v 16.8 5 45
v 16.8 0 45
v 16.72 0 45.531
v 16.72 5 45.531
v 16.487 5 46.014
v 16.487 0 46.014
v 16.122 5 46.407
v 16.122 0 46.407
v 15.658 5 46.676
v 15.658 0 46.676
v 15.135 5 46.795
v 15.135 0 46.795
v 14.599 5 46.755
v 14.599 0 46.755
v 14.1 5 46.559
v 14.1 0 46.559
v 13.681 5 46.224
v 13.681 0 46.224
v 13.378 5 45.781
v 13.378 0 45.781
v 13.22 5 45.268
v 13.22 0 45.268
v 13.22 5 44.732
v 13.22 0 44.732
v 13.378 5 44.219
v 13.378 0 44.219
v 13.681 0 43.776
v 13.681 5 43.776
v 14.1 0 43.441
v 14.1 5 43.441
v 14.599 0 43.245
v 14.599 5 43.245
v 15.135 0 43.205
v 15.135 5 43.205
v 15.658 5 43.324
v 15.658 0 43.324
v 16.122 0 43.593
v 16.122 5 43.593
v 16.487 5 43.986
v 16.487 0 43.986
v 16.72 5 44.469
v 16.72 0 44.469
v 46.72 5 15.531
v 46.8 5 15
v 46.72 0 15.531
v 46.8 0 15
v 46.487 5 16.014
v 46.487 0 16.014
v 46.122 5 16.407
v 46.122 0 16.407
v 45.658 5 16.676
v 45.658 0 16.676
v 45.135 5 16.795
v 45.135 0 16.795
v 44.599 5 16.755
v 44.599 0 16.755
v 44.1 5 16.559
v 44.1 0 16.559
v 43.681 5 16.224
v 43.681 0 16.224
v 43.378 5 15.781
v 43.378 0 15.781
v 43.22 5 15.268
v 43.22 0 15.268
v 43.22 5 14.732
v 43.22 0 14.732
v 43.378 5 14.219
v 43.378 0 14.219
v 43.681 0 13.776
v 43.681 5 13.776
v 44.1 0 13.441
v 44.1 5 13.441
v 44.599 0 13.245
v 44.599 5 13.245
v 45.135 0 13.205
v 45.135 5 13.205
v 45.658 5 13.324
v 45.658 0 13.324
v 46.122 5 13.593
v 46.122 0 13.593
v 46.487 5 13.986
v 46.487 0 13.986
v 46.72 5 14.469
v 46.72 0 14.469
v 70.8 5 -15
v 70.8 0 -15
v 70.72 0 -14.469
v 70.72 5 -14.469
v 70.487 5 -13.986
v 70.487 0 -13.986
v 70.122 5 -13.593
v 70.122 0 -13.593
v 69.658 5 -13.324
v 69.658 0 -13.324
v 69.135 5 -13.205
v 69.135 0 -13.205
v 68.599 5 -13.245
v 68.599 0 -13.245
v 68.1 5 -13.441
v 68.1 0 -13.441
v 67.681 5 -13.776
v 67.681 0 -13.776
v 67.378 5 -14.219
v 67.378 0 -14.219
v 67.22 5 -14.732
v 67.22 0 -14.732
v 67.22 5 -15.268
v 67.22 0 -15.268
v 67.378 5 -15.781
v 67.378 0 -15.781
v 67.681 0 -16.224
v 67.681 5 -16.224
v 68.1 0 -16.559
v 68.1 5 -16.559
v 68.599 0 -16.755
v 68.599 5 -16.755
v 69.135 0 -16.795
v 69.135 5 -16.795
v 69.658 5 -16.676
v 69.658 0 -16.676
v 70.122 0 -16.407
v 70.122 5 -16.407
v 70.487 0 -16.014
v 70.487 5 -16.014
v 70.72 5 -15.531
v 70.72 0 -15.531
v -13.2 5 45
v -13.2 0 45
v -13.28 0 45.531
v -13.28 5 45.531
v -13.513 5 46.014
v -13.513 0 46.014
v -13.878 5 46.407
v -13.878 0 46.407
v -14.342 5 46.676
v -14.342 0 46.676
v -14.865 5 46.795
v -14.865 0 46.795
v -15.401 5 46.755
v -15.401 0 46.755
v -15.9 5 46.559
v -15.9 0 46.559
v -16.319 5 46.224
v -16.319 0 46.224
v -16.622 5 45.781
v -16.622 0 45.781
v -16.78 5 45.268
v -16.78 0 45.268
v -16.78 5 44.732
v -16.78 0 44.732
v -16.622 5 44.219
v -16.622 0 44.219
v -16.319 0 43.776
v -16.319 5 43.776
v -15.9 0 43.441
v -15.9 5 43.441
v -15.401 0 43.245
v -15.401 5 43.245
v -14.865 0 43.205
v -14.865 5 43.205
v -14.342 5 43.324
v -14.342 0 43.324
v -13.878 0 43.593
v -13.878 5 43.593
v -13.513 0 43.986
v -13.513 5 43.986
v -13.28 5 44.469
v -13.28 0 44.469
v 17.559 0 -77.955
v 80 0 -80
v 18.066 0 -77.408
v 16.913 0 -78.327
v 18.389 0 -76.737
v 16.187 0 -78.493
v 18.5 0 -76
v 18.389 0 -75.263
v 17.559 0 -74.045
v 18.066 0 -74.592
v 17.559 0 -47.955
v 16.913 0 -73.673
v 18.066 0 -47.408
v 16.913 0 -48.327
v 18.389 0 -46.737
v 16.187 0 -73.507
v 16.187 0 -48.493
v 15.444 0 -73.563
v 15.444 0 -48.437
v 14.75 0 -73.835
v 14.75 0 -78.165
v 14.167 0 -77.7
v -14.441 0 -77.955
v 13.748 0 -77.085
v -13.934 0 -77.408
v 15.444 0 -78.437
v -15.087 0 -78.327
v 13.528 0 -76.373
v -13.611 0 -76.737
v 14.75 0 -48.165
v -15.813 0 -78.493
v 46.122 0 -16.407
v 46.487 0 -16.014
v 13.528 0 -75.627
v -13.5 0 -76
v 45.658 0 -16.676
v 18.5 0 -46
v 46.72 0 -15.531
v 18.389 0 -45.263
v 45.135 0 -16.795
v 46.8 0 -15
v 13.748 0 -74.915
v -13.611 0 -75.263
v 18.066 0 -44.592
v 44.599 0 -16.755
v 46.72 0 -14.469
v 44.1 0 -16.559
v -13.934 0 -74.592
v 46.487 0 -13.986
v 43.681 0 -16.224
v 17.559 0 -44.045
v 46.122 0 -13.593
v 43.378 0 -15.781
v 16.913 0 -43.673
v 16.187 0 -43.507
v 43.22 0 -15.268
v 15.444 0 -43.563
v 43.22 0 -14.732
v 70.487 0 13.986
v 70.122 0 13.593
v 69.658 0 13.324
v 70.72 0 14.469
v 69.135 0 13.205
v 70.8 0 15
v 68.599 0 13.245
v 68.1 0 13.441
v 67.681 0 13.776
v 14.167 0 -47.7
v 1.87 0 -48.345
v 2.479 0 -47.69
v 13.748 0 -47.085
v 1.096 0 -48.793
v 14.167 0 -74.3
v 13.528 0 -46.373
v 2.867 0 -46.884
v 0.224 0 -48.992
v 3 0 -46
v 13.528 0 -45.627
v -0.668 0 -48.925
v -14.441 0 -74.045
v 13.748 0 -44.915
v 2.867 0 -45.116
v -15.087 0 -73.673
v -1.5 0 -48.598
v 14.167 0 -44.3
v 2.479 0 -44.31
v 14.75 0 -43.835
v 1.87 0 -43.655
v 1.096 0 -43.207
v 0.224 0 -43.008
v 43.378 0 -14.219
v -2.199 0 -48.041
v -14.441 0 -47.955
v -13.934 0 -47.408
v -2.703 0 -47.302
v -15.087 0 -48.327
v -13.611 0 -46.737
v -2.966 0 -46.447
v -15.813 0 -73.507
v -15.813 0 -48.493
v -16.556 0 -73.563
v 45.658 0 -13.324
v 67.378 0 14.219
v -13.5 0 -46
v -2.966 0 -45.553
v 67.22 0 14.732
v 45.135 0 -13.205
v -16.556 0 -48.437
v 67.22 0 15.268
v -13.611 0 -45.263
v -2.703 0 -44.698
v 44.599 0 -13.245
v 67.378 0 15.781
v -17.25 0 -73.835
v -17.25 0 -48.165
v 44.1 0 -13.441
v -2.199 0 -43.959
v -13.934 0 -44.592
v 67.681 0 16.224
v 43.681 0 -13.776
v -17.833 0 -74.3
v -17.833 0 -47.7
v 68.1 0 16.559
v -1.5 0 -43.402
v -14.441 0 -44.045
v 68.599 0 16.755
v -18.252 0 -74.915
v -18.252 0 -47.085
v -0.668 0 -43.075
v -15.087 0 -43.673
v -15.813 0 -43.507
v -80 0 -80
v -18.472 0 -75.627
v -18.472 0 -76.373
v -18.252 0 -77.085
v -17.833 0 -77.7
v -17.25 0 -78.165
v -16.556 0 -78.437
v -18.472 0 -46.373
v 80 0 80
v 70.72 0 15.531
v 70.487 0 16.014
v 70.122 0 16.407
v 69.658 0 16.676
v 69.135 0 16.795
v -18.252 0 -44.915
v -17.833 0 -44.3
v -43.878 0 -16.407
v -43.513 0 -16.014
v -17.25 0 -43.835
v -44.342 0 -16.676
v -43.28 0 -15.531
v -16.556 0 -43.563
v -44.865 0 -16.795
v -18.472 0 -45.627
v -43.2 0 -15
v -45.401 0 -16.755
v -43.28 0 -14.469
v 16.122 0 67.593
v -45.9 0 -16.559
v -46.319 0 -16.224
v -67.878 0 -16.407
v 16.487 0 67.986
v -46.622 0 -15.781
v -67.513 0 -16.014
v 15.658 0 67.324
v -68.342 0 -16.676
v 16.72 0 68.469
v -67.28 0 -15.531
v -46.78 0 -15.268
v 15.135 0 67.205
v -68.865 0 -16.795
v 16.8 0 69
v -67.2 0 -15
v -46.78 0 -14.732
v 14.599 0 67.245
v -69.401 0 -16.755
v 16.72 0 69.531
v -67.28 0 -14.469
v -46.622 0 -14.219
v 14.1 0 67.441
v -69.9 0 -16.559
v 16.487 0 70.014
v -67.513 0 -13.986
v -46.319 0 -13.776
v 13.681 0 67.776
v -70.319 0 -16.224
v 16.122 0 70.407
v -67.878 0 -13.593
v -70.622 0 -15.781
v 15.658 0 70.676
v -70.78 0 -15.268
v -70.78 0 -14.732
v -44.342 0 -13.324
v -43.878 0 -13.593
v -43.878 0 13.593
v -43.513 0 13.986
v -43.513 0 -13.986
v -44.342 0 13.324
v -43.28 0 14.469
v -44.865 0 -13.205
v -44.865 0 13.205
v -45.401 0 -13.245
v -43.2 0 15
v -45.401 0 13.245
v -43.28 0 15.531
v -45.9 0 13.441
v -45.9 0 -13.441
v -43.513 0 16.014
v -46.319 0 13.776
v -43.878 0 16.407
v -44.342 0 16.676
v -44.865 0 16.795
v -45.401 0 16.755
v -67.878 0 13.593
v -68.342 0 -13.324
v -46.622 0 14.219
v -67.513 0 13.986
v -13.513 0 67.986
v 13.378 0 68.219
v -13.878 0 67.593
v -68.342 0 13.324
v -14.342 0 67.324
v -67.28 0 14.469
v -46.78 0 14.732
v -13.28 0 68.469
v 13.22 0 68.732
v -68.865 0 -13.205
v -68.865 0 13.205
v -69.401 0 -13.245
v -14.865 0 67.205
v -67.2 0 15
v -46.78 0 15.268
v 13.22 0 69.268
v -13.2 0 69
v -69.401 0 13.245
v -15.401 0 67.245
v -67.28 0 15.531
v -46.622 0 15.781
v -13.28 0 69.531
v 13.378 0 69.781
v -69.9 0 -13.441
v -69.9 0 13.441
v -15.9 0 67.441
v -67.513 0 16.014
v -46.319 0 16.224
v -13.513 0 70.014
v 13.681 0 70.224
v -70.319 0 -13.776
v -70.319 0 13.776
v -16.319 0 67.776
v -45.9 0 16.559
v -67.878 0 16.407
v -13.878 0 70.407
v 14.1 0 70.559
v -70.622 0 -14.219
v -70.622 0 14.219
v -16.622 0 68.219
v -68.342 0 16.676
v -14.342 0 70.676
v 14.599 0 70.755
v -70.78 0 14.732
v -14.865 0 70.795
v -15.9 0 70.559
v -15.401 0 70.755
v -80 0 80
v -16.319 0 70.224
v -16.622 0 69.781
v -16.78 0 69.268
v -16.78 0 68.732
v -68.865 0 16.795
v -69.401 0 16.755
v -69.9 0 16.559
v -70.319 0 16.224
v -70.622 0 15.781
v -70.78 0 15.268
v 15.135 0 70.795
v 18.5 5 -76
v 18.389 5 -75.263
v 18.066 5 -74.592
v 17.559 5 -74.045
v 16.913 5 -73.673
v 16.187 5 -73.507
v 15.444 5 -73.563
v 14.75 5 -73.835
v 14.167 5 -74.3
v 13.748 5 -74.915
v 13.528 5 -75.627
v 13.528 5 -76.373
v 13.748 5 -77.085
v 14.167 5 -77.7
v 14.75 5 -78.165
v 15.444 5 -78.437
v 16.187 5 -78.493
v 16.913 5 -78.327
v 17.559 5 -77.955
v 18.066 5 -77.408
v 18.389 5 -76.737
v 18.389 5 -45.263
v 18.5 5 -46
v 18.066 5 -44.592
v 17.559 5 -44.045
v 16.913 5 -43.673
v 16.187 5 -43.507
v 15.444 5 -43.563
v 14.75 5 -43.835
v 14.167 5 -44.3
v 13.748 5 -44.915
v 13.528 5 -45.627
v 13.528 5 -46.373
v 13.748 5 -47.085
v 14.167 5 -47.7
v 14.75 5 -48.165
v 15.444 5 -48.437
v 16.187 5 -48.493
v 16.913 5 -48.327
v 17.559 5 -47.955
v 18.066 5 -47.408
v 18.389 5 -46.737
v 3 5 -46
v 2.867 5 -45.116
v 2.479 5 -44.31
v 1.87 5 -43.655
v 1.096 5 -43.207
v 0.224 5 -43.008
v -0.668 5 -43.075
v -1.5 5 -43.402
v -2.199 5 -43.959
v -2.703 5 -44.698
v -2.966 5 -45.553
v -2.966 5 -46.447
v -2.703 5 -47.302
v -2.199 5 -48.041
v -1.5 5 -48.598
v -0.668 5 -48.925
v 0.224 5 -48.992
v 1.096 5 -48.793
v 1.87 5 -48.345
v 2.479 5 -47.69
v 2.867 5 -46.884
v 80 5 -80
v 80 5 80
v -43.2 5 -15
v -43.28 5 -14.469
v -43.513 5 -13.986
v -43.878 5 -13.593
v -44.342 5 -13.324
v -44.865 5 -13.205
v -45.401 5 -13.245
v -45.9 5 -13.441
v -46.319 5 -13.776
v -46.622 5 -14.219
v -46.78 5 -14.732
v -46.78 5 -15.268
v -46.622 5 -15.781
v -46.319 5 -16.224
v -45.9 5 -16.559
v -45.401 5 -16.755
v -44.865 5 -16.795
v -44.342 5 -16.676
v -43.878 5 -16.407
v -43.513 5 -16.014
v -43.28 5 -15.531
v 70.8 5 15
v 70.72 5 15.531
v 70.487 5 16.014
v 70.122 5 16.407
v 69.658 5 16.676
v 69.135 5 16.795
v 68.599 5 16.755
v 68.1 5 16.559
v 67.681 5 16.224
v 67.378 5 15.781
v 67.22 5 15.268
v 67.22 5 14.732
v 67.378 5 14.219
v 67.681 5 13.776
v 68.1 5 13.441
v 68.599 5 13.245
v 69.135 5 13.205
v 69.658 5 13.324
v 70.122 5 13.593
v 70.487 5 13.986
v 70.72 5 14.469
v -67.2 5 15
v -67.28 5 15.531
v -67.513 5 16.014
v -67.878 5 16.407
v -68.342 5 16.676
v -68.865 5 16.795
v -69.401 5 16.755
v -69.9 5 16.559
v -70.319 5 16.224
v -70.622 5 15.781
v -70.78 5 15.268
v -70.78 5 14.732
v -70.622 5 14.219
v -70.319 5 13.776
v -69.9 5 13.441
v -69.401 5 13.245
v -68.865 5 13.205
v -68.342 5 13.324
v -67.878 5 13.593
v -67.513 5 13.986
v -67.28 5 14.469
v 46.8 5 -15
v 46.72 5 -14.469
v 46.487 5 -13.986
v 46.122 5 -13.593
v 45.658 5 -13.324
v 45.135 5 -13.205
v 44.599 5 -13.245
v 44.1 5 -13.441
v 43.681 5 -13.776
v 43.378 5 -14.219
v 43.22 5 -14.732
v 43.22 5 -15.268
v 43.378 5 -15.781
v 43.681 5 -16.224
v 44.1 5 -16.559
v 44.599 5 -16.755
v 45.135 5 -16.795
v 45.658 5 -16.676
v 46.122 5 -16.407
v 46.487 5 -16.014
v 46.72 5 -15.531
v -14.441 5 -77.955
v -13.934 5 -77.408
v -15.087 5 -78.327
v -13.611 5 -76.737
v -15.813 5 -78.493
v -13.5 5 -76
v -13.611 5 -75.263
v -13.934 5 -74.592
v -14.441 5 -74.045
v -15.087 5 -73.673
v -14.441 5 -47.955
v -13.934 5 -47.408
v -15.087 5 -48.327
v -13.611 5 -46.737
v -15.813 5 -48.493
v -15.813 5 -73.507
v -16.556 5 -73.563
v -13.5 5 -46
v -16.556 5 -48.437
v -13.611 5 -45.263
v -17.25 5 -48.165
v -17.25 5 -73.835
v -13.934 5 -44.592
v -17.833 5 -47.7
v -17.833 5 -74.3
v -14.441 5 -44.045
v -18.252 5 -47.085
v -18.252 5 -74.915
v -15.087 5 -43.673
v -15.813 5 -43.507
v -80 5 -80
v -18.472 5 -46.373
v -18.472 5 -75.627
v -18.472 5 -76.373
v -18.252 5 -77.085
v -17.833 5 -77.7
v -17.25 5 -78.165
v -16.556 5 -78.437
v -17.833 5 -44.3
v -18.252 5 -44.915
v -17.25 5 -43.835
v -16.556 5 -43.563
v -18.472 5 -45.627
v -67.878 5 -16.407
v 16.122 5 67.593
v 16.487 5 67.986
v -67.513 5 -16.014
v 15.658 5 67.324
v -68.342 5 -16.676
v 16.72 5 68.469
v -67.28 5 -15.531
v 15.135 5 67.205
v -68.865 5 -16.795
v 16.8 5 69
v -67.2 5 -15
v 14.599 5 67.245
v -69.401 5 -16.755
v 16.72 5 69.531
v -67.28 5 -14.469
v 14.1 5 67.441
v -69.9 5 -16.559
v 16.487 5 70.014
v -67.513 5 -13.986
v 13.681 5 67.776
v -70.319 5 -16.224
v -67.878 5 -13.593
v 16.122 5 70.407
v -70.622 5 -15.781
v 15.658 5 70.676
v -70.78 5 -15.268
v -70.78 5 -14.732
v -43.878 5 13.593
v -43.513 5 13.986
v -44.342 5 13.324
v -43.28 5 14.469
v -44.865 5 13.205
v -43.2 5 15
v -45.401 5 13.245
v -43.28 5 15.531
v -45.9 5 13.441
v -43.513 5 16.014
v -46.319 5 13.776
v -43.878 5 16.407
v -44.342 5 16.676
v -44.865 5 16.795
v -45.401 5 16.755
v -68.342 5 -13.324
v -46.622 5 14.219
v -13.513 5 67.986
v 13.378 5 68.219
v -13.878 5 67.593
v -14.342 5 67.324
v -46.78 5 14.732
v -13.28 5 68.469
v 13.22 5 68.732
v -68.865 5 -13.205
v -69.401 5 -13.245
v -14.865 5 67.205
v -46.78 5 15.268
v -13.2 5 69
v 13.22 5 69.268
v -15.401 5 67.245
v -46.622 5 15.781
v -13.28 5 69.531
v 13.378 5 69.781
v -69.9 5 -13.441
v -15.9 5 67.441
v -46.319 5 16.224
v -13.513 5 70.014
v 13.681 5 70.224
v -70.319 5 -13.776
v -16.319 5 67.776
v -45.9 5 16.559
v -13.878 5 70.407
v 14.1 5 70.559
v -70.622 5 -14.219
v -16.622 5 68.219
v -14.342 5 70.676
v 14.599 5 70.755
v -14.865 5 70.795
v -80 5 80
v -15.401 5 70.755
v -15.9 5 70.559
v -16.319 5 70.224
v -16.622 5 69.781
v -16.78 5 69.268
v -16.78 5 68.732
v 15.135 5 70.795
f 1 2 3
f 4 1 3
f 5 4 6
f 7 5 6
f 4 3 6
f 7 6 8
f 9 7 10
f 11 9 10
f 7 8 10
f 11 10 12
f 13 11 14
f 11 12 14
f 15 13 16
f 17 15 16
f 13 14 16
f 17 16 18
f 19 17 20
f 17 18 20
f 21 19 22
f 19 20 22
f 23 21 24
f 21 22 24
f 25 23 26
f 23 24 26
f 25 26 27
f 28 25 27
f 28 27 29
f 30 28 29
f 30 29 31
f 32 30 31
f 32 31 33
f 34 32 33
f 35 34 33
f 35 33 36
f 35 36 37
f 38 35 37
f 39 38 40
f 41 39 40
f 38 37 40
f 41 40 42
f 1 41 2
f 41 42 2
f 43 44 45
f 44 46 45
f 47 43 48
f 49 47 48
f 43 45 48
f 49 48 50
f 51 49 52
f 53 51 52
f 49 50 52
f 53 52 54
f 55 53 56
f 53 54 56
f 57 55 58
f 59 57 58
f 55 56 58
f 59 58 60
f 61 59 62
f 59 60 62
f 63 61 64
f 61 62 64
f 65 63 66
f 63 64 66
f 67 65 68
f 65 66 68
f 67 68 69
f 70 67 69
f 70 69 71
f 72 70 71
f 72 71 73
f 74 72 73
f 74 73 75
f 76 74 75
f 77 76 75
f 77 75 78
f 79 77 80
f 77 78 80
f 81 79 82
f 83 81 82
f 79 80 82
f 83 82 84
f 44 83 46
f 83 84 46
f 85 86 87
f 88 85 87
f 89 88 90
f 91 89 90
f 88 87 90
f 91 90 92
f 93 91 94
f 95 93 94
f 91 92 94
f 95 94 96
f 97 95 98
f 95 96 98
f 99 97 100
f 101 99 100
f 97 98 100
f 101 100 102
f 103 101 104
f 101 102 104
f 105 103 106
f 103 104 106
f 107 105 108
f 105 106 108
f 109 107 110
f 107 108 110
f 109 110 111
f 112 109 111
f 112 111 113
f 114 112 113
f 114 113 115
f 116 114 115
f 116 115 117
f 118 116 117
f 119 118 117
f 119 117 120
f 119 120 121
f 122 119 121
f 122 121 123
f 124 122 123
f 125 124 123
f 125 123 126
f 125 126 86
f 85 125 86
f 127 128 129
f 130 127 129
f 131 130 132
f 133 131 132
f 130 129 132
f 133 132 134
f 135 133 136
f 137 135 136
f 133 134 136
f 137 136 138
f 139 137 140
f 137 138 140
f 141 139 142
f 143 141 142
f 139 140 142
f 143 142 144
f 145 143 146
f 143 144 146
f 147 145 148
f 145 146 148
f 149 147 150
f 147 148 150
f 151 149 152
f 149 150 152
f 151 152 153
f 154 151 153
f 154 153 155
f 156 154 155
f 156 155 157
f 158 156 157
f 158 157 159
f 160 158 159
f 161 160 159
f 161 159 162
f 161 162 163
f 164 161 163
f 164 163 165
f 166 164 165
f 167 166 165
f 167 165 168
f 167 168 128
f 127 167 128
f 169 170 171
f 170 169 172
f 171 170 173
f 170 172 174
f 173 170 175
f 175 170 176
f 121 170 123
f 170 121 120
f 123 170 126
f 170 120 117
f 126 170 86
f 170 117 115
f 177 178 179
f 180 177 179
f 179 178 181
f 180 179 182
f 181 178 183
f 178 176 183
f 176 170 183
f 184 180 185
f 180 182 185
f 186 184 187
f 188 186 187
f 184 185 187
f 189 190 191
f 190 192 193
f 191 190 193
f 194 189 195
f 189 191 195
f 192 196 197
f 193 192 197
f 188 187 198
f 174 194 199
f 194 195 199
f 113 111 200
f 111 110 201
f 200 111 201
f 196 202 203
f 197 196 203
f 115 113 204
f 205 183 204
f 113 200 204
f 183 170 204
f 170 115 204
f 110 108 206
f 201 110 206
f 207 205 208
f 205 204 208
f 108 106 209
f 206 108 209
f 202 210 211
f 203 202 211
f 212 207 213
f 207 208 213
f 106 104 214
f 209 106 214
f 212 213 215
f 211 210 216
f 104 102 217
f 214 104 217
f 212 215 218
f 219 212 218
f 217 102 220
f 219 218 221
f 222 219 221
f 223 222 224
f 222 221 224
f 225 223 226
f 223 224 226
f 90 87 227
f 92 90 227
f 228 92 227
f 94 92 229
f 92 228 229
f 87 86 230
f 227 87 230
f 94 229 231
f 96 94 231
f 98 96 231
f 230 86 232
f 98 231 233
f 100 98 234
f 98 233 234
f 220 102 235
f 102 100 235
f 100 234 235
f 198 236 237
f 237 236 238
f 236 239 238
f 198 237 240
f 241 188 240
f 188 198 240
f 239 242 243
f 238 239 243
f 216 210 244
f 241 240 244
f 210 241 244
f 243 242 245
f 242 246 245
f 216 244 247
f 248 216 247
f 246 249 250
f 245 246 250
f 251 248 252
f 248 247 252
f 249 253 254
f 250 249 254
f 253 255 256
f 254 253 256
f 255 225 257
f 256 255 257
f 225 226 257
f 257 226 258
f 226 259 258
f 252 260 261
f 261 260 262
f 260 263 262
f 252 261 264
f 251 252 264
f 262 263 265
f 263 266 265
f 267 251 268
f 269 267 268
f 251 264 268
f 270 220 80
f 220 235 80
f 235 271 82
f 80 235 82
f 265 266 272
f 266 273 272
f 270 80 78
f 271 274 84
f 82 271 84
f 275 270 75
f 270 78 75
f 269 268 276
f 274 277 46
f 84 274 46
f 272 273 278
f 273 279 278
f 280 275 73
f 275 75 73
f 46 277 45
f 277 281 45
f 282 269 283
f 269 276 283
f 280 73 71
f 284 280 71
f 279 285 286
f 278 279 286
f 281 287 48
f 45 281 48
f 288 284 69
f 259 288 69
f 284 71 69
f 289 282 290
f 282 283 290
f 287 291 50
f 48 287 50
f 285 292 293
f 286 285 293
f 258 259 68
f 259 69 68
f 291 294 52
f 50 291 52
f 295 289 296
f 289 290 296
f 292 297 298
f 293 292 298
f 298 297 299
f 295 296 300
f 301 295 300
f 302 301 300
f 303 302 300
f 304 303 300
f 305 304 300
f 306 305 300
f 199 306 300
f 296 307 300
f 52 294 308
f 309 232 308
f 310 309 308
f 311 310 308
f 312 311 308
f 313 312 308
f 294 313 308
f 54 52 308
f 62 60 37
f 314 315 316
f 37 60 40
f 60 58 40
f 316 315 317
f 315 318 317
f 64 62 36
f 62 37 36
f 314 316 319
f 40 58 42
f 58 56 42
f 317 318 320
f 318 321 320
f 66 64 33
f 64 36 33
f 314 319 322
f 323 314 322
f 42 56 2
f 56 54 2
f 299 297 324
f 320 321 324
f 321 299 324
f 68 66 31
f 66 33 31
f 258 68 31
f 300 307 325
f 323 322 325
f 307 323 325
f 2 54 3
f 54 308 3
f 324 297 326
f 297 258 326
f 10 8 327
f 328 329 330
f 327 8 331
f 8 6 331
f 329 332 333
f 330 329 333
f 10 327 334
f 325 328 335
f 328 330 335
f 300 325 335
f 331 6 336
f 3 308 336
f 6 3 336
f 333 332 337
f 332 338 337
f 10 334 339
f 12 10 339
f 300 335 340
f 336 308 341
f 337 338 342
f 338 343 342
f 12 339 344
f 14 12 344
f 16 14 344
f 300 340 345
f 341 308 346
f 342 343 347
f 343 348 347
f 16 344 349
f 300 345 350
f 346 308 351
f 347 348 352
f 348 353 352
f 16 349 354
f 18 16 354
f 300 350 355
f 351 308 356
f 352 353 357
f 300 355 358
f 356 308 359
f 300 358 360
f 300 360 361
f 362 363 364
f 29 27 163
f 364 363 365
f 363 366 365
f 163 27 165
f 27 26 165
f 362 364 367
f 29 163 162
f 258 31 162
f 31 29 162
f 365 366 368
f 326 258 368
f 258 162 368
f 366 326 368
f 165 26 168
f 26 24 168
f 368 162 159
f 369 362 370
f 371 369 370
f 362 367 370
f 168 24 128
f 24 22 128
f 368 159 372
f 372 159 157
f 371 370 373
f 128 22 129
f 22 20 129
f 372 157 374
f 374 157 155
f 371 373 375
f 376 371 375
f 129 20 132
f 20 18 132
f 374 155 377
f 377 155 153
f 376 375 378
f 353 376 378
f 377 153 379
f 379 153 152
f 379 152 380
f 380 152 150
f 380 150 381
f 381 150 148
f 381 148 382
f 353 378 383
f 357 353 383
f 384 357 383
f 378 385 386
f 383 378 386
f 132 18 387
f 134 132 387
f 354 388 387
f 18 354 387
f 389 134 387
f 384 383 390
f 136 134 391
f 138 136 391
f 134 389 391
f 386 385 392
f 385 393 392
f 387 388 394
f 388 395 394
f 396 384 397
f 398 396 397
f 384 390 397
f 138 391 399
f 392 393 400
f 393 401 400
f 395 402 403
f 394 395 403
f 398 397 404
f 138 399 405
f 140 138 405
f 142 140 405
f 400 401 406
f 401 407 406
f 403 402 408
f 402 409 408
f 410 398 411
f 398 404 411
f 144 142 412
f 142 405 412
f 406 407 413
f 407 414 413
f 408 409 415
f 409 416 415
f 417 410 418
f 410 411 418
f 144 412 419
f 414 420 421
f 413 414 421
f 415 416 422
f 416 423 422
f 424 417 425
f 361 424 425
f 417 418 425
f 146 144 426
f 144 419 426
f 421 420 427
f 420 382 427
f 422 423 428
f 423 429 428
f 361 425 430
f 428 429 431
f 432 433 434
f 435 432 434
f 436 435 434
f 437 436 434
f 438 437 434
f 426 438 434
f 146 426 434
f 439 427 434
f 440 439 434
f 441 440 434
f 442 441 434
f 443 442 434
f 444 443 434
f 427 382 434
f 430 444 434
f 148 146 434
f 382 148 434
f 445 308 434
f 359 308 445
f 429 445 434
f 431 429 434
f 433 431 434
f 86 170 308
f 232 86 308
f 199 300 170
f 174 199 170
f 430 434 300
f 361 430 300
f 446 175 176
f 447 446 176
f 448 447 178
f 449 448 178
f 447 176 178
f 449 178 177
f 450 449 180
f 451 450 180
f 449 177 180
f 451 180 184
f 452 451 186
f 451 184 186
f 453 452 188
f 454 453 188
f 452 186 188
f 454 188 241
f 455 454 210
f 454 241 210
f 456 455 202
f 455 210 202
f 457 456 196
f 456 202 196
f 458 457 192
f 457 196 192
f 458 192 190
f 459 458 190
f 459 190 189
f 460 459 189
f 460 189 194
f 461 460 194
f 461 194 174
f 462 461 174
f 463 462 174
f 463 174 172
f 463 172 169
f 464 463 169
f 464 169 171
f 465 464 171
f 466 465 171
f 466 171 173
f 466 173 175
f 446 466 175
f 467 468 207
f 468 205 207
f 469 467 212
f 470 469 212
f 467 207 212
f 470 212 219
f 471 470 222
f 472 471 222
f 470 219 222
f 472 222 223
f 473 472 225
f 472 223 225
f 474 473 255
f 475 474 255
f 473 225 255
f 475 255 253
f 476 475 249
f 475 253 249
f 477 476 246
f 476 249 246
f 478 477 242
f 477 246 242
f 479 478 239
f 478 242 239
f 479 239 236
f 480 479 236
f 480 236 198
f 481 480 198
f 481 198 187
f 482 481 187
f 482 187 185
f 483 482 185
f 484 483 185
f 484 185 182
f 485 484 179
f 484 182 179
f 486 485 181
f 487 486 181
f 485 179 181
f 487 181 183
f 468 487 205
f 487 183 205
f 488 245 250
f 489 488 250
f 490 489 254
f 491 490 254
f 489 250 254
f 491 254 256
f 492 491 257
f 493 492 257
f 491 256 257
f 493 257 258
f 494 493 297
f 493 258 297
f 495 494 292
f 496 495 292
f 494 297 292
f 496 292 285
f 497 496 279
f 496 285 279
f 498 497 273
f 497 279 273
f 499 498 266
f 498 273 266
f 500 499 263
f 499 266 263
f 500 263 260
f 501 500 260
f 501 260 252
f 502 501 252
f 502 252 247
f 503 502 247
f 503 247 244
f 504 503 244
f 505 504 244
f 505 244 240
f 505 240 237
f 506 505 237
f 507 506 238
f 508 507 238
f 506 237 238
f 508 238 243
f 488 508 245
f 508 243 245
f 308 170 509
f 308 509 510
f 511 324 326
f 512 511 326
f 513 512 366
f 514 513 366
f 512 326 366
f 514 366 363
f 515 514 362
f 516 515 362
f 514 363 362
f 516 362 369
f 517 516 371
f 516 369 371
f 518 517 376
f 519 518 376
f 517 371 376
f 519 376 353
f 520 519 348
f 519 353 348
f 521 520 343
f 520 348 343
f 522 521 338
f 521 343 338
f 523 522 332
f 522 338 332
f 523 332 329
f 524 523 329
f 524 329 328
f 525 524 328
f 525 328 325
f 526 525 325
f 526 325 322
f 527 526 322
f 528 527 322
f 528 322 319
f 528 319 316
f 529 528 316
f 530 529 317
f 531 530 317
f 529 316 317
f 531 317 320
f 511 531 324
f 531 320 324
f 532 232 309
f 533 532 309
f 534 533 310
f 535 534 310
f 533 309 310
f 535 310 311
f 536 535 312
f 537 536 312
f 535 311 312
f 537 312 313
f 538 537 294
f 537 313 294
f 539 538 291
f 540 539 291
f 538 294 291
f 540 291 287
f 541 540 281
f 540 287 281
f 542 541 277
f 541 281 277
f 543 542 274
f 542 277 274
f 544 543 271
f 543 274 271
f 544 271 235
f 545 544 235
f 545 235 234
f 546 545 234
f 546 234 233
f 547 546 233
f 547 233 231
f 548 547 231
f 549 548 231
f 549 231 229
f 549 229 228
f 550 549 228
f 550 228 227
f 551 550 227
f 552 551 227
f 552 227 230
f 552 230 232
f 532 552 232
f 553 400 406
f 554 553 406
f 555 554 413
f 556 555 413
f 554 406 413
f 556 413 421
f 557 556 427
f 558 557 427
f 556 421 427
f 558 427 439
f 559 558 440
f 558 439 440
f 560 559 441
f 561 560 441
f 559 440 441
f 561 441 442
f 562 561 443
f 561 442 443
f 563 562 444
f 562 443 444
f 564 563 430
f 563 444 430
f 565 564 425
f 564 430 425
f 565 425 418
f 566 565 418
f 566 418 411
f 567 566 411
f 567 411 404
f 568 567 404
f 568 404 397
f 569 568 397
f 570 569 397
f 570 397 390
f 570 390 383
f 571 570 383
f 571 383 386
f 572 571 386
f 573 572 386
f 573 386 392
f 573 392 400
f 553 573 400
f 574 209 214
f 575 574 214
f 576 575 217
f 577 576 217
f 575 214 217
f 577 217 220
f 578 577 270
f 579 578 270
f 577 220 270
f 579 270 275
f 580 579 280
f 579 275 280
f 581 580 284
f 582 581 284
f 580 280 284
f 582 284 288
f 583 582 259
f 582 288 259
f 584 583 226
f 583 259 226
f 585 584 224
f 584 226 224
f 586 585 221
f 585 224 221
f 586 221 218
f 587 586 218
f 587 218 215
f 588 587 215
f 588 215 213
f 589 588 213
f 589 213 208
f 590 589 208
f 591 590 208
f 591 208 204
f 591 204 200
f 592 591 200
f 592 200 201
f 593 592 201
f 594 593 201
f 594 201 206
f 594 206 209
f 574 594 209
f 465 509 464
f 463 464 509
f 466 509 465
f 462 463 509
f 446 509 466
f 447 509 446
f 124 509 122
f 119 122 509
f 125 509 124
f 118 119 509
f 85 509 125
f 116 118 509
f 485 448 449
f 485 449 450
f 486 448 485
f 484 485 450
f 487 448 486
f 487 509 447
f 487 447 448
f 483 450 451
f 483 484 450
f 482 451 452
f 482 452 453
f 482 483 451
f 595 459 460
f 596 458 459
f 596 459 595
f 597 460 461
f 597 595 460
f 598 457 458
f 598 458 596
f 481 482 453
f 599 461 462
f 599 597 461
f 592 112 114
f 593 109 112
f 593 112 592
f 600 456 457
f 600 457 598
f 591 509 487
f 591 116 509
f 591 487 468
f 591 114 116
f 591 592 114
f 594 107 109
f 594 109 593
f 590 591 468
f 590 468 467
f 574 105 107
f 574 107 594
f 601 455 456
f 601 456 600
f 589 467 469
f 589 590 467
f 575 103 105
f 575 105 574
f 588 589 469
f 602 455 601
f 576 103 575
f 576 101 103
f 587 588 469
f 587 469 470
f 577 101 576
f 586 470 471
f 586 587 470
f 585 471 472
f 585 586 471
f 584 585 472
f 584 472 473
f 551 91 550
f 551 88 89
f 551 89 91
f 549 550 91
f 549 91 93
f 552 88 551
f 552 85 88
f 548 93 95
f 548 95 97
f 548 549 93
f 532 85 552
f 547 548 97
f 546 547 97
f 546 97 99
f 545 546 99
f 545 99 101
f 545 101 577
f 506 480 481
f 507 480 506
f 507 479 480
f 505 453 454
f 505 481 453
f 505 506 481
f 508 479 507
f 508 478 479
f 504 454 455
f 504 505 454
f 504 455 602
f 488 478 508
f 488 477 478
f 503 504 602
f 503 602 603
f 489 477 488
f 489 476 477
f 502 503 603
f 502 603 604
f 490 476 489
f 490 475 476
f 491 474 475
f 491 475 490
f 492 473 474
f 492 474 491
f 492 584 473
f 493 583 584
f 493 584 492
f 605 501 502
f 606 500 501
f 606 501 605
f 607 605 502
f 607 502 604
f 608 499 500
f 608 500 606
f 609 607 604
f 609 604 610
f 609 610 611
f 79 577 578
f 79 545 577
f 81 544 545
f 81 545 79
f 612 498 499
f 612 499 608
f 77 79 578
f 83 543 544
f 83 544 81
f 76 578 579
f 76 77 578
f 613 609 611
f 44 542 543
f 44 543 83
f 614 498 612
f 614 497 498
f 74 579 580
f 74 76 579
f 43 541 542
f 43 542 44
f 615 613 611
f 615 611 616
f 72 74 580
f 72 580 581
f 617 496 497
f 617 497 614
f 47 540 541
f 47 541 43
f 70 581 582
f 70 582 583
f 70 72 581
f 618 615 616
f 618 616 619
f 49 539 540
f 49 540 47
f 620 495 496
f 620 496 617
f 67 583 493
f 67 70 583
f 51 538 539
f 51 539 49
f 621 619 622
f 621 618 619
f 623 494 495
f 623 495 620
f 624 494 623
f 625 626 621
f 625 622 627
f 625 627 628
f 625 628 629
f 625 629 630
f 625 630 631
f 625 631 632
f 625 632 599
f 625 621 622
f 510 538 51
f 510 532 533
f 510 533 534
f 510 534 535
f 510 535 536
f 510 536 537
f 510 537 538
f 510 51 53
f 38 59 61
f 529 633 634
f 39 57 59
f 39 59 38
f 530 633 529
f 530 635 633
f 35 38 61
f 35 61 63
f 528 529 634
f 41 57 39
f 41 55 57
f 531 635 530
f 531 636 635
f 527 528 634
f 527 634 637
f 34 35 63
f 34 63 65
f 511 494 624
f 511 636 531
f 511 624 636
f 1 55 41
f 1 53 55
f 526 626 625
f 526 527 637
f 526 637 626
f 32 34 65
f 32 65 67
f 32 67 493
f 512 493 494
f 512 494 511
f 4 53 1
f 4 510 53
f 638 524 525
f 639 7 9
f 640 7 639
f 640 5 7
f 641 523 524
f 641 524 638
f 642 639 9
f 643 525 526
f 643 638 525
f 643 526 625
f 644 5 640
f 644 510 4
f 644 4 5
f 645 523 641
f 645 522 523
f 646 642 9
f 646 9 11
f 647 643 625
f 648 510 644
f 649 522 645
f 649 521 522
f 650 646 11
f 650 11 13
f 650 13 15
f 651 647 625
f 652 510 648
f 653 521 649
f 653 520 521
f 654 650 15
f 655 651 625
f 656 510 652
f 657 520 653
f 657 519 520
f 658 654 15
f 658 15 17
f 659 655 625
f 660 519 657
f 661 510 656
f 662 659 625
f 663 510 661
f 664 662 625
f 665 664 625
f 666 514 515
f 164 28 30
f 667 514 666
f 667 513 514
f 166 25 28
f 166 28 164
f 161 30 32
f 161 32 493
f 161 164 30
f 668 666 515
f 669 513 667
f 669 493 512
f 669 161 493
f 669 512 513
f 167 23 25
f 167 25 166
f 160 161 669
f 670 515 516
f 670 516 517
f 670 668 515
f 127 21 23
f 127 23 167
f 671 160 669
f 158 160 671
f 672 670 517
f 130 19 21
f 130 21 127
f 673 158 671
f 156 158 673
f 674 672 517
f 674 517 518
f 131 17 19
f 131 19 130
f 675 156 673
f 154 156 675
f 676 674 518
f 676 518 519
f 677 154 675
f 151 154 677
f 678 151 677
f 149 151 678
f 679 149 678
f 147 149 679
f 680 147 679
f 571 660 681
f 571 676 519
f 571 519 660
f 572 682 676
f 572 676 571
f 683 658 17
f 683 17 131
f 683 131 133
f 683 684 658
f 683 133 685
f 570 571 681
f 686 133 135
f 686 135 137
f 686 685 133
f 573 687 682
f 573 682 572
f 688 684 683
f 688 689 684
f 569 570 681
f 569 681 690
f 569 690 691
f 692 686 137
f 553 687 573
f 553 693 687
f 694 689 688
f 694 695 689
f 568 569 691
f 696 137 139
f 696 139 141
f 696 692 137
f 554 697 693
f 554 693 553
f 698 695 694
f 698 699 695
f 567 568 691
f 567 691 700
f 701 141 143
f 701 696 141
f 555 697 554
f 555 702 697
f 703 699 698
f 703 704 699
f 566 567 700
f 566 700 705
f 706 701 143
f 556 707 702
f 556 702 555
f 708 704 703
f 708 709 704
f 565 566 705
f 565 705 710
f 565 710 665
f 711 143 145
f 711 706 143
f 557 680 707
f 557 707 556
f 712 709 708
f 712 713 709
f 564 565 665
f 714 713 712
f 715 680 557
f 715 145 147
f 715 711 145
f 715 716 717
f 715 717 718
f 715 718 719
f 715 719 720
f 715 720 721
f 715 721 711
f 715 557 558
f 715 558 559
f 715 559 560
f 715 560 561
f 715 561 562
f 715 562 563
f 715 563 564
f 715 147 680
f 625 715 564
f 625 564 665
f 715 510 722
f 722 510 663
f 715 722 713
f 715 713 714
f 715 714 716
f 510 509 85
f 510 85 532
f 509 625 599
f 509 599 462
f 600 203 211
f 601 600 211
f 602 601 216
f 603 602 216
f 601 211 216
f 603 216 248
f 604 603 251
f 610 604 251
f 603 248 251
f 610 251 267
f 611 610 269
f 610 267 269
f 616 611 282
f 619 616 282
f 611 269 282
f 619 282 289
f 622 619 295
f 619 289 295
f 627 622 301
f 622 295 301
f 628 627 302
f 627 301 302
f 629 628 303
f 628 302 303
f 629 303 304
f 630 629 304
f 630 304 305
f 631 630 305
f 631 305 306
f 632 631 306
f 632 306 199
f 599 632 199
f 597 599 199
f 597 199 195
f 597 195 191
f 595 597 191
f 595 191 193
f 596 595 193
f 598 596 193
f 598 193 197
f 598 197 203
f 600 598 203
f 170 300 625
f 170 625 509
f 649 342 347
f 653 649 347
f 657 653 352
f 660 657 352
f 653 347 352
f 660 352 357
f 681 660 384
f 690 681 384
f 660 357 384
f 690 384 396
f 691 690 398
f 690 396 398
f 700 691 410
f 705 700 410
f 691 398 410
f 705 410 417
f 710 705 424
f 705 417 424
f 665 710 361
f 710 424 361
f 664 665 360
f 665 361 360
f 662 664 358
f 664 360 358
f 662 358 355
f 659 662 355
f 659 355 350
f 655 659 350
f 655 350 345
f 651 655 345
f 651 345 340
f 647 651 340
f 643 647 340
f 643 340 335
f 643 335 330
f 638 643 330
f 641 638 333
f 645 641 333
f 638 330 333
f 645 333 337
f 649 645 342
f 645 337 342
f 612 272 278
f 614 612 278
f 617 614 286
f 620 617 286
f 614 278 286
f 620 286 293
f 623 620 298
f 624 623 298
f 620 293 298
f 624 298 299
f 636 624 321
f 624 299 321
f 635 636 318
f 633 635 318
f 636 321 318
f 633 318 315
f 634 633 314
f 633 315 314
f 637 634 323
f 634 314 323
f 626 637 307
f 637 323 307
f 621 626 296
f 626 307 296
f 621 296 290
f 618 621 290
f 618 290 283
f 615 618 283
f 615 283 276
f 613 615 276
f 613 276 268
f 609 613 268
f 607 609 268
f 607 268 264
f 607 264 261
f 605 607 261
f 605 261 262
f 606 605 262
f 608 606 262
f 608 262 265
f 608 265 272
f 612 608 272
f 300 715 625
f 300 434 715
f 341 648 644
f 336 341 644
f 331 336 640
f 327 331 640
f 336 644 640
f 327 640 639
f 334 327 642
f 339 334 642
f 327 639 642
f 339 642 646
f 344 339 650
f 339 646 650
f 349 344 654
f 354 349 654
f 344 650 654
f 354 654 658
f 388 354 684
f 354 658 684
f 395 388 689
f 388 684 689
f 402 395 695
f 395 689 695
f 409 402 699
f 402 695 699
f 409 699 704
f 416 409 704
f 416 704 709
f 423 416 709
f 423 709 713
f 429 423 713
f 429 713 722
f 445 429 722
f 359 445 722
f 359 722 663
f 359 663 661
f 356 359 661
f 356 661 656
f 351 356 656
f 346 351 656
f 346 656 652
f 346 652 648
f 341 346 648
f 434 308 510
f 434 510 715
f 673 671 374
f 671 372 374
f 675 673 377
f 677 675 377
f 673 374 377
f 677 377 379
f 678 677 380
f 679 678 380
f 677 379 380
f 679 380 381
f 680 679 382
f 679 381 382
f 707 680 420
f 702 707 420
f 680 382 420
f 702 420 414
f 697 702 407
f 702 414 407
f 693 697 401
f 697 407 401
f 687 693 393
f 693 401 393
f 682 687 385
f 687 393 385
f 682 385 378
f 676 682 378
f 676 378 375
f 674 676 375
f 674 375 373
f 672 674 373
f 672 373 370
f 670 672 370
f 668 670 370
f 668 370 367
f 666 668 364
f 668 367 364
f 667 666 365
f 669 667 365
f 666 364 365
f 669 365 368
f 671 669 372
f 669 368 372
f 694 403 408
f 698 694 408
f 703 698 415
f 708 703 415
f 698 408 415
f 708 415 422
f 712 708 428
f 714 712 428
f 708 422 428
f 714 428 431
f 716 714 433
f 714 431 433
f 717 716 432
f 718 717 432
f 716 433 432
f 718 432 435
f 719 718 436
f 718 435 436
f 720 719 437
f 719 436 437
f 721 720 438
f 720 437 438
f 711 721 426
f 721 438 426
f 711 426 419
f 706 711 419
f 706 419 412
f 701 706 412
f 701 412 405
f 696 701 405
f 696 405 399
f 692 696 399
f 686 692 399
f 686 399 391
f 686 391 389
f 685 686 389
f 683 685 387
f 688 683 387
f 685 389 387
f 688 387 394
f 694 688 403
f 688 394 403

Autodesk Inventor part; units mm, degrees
ref_plane "YZ Plane" through (0, 0, 0) normal (1, 0, 0) x (0, 1, 0)
ref_plane "XZ Plane" through (0, 0, 0) normal (0, 1, 0) x (-1, 0, 0)
ref_plane "XY Plane" through (0, 0, 0) normal (0, 0, 1) x (1, 0, 0)
sketch "草图19" plane through (0, 0, 0) normal (0, 1, 0) x (-1, 0, 0)
  line L0 (-80, 80) -> (80, 80)
  line L1 (80, 80) -> (80, -80)
  line L2 (80, -80) -> (-80, -80)
  line L3 (-80, -80) -> (-80, 80)
  point P0 (0, 0)
  dimension "d55" = 160
  dimension "d56" = 160
extrude "拉伸19" add sketch "草图19" along normal blind 5
sketch "草图20" plane through (0, 5, 0) normal (0, 1, 0) x (1, 0, 0)
  circle A0 centre (15, -69) radius 1.8
  point P0 (0, 0)
  dimension "d59" = 3.6
extrude "拉伸20" cut sketch "草图20" against normal through all
sketch "草图21" plane through (0, 0, 0) normal (0, -1, 0) x (1, 0, 0)
  circle A0 centre (-15, 69) radius 1.8
  point P0 (0, 0)
  dimension "d62" = 3.6
extrude "拉伸21" cut sketch "草图21" against normal through all
sketch "草图26" plane through (0, 0, 0) normal (0, -1, 0) x (1, 0, 0)
  circle A0 centre (15, 45) radius 1.8
  point P0 (0, 0)
  dimension "d73" = 3.6
extrude "拉伸24" cut sketch "草图26" against normal through all
sketch "草图27" plane through (0, 0, 0) normal (0, -1, 0) x (1, 0, 0)
  circle A0 centre (-15, 45) radius 1.8
  point P0 (0, 0)
  dimension "d76" = 3.6
extrude "拉伸25" cut sketch "草图27" against normal through all
sketch "草图28" plane through (0, 0, 0) normal (0, -1, 0) x (1, 0, 0)
  circle A0 centre (45, 15) radius 1.8
  point P0 (0, 0)
  dimension "d79" = 3.6
extrude "拉伸26" cut sketch "草图28" against normal through all
sketch "草图29" plane through (0, 0, 0) normal (0, -1, 0) x (1, 0, 0)
  circle A0 centre (45, -15) radius 1.8
  point P0 (0, 0)
  dimension "d82" = 3.6
extrude "拉伸27" cut sketch "草图29" against normal through all
sketch "草图30" plane through (0, 0, 0) normal (0, -1, 0) x (1, 0, 0)
  circle A0 centre (69, 15) radius 1.8
  point P0 (0, 0)
  dimension "d85" = 3.6
extrude "拉伸28" cut sketch "草图30" against normal through all
sketch "草图31" plane through (0, 0, 0) normal (0, -1, 0) x (1, 0, 0)
  circle A0 centre (69, -15) radius 1.8
  point P0 (0, 0)
  dimension "d88" = 3.6
extrude "拉伸29" cut sketch "草图31" against normal through all
sketch "草图32" plane through (0, 0, 0) normal (0, -1, 0) x (1, 0, 0)
  circle A0 centre (-69, 15) radius 1.8
  point P0 (0, 0)
  dimension "d91" = 3.6
extrude "拉伸30" cut sketch "草图32" against normal through all
sketch "草图33" plane through (0, 0, 0) normal (0, -1, 0) x (1, 0, 0)
  circle A0 centre (-45, 15) radius 1.8
  point P0 (0, 0)
  dimension "d94" = 3.6
extrude "拉伸31" cut sketch "草图33" against normal through all
sketch "草图34" plane through (0, 0, 0) normal (0, -1, 0) x (1, 0, 0)
  circle A0 centre (-69, -15) radius 1.8
  point P0 (0, 0)
  dimension "d97" = 3.6
extrude "拉伸32" cut sketch "草图34" against normal through all
sketch "草图35" plane through (0, 0, 0) normal (0, -1, 0) x (1, 0, 0)
  circle A0 centre (-45, -15) radius 1.8
  point P0 (0, 0)
  dimension "d100" = 3.6
extrude "拉伸33" cut sketch "草图35" against normal through all
sketch "草图36" plane through (0, 0, 0) normal (0, -1, 0) x (1, 0, 0)
  point P0 (0, 0)
sketch "草图37" plane through (0, 0, 0) normal (0, -1, 0) x (1, 0, 0)
  circle A0 centre (0, -46) radius 3
  point P0 (0, 0)
  dimension "d103" = 6
extrude "拉伸34" cut sketch "草图37" against normal through all
sketch "草图38" plane through (0, 0, 0) normal (0, -1, 0) x (1, 0, 0)
  circle A0 centre (-16, -46) radius 2.5
  point P0 (0, 0)
  dimension "d106" = 5
extrude "拉伸35" cut sketch "草图38" against normal through all
sketch "草图39" plane through (0, 0, 0) normal (0, -1, 0) x (1, 0, 0)
  circle A0 centre (16, -46) radius 2.5
  point P0 (0, 0)
  dimension "d109" = 5
extrude "拉伸36" cut sketch "草图39" against normal through all
sketch "草图40" plane through (0, 0, 0) normal (0, -1, 0) x (1, 0, 0)
  circle A0 centre (-16, -76) radius 2.5
  point P0 (0, 0)
  dimension "d112" = 5
extrude "拉伸37" cut sketch "草图40" against normal through all
sketch "草图41" plane through (0, 0, 0) normal (0, -1, 0) x (1, 0, 0)
  circle A0 centre (16, -76) radius 2.5
  point P0 (0, 0)
  dimension "d115" = 5
extrude "拉伸38" cut sketch "草图41" against normal through all
sketch "草图42" plane through (0, 0, 0) normal (0, -1, 0) x (1, 0, 0)
  point P0 (0, 0)
equation "\"折弯半径\" = 厚度"
equation "\"折弯释压宽度\" = 厚度"
equation "\"折弯释压深度\" = 0.5 * 厚度"
equation "\"拐角释压尺寸\" = 4 * 厚度"
equation "\"最小余量\" = 2 * 厚度"
equation "\"过渡半径\" = 折弯半径"
equation "\"Jacobi半径尺寸\" = 折弯半径"
equation "\"间隙大小\" = 厚度"
equation "\"厚度\" = 0.5"
properties part number "内层板"
